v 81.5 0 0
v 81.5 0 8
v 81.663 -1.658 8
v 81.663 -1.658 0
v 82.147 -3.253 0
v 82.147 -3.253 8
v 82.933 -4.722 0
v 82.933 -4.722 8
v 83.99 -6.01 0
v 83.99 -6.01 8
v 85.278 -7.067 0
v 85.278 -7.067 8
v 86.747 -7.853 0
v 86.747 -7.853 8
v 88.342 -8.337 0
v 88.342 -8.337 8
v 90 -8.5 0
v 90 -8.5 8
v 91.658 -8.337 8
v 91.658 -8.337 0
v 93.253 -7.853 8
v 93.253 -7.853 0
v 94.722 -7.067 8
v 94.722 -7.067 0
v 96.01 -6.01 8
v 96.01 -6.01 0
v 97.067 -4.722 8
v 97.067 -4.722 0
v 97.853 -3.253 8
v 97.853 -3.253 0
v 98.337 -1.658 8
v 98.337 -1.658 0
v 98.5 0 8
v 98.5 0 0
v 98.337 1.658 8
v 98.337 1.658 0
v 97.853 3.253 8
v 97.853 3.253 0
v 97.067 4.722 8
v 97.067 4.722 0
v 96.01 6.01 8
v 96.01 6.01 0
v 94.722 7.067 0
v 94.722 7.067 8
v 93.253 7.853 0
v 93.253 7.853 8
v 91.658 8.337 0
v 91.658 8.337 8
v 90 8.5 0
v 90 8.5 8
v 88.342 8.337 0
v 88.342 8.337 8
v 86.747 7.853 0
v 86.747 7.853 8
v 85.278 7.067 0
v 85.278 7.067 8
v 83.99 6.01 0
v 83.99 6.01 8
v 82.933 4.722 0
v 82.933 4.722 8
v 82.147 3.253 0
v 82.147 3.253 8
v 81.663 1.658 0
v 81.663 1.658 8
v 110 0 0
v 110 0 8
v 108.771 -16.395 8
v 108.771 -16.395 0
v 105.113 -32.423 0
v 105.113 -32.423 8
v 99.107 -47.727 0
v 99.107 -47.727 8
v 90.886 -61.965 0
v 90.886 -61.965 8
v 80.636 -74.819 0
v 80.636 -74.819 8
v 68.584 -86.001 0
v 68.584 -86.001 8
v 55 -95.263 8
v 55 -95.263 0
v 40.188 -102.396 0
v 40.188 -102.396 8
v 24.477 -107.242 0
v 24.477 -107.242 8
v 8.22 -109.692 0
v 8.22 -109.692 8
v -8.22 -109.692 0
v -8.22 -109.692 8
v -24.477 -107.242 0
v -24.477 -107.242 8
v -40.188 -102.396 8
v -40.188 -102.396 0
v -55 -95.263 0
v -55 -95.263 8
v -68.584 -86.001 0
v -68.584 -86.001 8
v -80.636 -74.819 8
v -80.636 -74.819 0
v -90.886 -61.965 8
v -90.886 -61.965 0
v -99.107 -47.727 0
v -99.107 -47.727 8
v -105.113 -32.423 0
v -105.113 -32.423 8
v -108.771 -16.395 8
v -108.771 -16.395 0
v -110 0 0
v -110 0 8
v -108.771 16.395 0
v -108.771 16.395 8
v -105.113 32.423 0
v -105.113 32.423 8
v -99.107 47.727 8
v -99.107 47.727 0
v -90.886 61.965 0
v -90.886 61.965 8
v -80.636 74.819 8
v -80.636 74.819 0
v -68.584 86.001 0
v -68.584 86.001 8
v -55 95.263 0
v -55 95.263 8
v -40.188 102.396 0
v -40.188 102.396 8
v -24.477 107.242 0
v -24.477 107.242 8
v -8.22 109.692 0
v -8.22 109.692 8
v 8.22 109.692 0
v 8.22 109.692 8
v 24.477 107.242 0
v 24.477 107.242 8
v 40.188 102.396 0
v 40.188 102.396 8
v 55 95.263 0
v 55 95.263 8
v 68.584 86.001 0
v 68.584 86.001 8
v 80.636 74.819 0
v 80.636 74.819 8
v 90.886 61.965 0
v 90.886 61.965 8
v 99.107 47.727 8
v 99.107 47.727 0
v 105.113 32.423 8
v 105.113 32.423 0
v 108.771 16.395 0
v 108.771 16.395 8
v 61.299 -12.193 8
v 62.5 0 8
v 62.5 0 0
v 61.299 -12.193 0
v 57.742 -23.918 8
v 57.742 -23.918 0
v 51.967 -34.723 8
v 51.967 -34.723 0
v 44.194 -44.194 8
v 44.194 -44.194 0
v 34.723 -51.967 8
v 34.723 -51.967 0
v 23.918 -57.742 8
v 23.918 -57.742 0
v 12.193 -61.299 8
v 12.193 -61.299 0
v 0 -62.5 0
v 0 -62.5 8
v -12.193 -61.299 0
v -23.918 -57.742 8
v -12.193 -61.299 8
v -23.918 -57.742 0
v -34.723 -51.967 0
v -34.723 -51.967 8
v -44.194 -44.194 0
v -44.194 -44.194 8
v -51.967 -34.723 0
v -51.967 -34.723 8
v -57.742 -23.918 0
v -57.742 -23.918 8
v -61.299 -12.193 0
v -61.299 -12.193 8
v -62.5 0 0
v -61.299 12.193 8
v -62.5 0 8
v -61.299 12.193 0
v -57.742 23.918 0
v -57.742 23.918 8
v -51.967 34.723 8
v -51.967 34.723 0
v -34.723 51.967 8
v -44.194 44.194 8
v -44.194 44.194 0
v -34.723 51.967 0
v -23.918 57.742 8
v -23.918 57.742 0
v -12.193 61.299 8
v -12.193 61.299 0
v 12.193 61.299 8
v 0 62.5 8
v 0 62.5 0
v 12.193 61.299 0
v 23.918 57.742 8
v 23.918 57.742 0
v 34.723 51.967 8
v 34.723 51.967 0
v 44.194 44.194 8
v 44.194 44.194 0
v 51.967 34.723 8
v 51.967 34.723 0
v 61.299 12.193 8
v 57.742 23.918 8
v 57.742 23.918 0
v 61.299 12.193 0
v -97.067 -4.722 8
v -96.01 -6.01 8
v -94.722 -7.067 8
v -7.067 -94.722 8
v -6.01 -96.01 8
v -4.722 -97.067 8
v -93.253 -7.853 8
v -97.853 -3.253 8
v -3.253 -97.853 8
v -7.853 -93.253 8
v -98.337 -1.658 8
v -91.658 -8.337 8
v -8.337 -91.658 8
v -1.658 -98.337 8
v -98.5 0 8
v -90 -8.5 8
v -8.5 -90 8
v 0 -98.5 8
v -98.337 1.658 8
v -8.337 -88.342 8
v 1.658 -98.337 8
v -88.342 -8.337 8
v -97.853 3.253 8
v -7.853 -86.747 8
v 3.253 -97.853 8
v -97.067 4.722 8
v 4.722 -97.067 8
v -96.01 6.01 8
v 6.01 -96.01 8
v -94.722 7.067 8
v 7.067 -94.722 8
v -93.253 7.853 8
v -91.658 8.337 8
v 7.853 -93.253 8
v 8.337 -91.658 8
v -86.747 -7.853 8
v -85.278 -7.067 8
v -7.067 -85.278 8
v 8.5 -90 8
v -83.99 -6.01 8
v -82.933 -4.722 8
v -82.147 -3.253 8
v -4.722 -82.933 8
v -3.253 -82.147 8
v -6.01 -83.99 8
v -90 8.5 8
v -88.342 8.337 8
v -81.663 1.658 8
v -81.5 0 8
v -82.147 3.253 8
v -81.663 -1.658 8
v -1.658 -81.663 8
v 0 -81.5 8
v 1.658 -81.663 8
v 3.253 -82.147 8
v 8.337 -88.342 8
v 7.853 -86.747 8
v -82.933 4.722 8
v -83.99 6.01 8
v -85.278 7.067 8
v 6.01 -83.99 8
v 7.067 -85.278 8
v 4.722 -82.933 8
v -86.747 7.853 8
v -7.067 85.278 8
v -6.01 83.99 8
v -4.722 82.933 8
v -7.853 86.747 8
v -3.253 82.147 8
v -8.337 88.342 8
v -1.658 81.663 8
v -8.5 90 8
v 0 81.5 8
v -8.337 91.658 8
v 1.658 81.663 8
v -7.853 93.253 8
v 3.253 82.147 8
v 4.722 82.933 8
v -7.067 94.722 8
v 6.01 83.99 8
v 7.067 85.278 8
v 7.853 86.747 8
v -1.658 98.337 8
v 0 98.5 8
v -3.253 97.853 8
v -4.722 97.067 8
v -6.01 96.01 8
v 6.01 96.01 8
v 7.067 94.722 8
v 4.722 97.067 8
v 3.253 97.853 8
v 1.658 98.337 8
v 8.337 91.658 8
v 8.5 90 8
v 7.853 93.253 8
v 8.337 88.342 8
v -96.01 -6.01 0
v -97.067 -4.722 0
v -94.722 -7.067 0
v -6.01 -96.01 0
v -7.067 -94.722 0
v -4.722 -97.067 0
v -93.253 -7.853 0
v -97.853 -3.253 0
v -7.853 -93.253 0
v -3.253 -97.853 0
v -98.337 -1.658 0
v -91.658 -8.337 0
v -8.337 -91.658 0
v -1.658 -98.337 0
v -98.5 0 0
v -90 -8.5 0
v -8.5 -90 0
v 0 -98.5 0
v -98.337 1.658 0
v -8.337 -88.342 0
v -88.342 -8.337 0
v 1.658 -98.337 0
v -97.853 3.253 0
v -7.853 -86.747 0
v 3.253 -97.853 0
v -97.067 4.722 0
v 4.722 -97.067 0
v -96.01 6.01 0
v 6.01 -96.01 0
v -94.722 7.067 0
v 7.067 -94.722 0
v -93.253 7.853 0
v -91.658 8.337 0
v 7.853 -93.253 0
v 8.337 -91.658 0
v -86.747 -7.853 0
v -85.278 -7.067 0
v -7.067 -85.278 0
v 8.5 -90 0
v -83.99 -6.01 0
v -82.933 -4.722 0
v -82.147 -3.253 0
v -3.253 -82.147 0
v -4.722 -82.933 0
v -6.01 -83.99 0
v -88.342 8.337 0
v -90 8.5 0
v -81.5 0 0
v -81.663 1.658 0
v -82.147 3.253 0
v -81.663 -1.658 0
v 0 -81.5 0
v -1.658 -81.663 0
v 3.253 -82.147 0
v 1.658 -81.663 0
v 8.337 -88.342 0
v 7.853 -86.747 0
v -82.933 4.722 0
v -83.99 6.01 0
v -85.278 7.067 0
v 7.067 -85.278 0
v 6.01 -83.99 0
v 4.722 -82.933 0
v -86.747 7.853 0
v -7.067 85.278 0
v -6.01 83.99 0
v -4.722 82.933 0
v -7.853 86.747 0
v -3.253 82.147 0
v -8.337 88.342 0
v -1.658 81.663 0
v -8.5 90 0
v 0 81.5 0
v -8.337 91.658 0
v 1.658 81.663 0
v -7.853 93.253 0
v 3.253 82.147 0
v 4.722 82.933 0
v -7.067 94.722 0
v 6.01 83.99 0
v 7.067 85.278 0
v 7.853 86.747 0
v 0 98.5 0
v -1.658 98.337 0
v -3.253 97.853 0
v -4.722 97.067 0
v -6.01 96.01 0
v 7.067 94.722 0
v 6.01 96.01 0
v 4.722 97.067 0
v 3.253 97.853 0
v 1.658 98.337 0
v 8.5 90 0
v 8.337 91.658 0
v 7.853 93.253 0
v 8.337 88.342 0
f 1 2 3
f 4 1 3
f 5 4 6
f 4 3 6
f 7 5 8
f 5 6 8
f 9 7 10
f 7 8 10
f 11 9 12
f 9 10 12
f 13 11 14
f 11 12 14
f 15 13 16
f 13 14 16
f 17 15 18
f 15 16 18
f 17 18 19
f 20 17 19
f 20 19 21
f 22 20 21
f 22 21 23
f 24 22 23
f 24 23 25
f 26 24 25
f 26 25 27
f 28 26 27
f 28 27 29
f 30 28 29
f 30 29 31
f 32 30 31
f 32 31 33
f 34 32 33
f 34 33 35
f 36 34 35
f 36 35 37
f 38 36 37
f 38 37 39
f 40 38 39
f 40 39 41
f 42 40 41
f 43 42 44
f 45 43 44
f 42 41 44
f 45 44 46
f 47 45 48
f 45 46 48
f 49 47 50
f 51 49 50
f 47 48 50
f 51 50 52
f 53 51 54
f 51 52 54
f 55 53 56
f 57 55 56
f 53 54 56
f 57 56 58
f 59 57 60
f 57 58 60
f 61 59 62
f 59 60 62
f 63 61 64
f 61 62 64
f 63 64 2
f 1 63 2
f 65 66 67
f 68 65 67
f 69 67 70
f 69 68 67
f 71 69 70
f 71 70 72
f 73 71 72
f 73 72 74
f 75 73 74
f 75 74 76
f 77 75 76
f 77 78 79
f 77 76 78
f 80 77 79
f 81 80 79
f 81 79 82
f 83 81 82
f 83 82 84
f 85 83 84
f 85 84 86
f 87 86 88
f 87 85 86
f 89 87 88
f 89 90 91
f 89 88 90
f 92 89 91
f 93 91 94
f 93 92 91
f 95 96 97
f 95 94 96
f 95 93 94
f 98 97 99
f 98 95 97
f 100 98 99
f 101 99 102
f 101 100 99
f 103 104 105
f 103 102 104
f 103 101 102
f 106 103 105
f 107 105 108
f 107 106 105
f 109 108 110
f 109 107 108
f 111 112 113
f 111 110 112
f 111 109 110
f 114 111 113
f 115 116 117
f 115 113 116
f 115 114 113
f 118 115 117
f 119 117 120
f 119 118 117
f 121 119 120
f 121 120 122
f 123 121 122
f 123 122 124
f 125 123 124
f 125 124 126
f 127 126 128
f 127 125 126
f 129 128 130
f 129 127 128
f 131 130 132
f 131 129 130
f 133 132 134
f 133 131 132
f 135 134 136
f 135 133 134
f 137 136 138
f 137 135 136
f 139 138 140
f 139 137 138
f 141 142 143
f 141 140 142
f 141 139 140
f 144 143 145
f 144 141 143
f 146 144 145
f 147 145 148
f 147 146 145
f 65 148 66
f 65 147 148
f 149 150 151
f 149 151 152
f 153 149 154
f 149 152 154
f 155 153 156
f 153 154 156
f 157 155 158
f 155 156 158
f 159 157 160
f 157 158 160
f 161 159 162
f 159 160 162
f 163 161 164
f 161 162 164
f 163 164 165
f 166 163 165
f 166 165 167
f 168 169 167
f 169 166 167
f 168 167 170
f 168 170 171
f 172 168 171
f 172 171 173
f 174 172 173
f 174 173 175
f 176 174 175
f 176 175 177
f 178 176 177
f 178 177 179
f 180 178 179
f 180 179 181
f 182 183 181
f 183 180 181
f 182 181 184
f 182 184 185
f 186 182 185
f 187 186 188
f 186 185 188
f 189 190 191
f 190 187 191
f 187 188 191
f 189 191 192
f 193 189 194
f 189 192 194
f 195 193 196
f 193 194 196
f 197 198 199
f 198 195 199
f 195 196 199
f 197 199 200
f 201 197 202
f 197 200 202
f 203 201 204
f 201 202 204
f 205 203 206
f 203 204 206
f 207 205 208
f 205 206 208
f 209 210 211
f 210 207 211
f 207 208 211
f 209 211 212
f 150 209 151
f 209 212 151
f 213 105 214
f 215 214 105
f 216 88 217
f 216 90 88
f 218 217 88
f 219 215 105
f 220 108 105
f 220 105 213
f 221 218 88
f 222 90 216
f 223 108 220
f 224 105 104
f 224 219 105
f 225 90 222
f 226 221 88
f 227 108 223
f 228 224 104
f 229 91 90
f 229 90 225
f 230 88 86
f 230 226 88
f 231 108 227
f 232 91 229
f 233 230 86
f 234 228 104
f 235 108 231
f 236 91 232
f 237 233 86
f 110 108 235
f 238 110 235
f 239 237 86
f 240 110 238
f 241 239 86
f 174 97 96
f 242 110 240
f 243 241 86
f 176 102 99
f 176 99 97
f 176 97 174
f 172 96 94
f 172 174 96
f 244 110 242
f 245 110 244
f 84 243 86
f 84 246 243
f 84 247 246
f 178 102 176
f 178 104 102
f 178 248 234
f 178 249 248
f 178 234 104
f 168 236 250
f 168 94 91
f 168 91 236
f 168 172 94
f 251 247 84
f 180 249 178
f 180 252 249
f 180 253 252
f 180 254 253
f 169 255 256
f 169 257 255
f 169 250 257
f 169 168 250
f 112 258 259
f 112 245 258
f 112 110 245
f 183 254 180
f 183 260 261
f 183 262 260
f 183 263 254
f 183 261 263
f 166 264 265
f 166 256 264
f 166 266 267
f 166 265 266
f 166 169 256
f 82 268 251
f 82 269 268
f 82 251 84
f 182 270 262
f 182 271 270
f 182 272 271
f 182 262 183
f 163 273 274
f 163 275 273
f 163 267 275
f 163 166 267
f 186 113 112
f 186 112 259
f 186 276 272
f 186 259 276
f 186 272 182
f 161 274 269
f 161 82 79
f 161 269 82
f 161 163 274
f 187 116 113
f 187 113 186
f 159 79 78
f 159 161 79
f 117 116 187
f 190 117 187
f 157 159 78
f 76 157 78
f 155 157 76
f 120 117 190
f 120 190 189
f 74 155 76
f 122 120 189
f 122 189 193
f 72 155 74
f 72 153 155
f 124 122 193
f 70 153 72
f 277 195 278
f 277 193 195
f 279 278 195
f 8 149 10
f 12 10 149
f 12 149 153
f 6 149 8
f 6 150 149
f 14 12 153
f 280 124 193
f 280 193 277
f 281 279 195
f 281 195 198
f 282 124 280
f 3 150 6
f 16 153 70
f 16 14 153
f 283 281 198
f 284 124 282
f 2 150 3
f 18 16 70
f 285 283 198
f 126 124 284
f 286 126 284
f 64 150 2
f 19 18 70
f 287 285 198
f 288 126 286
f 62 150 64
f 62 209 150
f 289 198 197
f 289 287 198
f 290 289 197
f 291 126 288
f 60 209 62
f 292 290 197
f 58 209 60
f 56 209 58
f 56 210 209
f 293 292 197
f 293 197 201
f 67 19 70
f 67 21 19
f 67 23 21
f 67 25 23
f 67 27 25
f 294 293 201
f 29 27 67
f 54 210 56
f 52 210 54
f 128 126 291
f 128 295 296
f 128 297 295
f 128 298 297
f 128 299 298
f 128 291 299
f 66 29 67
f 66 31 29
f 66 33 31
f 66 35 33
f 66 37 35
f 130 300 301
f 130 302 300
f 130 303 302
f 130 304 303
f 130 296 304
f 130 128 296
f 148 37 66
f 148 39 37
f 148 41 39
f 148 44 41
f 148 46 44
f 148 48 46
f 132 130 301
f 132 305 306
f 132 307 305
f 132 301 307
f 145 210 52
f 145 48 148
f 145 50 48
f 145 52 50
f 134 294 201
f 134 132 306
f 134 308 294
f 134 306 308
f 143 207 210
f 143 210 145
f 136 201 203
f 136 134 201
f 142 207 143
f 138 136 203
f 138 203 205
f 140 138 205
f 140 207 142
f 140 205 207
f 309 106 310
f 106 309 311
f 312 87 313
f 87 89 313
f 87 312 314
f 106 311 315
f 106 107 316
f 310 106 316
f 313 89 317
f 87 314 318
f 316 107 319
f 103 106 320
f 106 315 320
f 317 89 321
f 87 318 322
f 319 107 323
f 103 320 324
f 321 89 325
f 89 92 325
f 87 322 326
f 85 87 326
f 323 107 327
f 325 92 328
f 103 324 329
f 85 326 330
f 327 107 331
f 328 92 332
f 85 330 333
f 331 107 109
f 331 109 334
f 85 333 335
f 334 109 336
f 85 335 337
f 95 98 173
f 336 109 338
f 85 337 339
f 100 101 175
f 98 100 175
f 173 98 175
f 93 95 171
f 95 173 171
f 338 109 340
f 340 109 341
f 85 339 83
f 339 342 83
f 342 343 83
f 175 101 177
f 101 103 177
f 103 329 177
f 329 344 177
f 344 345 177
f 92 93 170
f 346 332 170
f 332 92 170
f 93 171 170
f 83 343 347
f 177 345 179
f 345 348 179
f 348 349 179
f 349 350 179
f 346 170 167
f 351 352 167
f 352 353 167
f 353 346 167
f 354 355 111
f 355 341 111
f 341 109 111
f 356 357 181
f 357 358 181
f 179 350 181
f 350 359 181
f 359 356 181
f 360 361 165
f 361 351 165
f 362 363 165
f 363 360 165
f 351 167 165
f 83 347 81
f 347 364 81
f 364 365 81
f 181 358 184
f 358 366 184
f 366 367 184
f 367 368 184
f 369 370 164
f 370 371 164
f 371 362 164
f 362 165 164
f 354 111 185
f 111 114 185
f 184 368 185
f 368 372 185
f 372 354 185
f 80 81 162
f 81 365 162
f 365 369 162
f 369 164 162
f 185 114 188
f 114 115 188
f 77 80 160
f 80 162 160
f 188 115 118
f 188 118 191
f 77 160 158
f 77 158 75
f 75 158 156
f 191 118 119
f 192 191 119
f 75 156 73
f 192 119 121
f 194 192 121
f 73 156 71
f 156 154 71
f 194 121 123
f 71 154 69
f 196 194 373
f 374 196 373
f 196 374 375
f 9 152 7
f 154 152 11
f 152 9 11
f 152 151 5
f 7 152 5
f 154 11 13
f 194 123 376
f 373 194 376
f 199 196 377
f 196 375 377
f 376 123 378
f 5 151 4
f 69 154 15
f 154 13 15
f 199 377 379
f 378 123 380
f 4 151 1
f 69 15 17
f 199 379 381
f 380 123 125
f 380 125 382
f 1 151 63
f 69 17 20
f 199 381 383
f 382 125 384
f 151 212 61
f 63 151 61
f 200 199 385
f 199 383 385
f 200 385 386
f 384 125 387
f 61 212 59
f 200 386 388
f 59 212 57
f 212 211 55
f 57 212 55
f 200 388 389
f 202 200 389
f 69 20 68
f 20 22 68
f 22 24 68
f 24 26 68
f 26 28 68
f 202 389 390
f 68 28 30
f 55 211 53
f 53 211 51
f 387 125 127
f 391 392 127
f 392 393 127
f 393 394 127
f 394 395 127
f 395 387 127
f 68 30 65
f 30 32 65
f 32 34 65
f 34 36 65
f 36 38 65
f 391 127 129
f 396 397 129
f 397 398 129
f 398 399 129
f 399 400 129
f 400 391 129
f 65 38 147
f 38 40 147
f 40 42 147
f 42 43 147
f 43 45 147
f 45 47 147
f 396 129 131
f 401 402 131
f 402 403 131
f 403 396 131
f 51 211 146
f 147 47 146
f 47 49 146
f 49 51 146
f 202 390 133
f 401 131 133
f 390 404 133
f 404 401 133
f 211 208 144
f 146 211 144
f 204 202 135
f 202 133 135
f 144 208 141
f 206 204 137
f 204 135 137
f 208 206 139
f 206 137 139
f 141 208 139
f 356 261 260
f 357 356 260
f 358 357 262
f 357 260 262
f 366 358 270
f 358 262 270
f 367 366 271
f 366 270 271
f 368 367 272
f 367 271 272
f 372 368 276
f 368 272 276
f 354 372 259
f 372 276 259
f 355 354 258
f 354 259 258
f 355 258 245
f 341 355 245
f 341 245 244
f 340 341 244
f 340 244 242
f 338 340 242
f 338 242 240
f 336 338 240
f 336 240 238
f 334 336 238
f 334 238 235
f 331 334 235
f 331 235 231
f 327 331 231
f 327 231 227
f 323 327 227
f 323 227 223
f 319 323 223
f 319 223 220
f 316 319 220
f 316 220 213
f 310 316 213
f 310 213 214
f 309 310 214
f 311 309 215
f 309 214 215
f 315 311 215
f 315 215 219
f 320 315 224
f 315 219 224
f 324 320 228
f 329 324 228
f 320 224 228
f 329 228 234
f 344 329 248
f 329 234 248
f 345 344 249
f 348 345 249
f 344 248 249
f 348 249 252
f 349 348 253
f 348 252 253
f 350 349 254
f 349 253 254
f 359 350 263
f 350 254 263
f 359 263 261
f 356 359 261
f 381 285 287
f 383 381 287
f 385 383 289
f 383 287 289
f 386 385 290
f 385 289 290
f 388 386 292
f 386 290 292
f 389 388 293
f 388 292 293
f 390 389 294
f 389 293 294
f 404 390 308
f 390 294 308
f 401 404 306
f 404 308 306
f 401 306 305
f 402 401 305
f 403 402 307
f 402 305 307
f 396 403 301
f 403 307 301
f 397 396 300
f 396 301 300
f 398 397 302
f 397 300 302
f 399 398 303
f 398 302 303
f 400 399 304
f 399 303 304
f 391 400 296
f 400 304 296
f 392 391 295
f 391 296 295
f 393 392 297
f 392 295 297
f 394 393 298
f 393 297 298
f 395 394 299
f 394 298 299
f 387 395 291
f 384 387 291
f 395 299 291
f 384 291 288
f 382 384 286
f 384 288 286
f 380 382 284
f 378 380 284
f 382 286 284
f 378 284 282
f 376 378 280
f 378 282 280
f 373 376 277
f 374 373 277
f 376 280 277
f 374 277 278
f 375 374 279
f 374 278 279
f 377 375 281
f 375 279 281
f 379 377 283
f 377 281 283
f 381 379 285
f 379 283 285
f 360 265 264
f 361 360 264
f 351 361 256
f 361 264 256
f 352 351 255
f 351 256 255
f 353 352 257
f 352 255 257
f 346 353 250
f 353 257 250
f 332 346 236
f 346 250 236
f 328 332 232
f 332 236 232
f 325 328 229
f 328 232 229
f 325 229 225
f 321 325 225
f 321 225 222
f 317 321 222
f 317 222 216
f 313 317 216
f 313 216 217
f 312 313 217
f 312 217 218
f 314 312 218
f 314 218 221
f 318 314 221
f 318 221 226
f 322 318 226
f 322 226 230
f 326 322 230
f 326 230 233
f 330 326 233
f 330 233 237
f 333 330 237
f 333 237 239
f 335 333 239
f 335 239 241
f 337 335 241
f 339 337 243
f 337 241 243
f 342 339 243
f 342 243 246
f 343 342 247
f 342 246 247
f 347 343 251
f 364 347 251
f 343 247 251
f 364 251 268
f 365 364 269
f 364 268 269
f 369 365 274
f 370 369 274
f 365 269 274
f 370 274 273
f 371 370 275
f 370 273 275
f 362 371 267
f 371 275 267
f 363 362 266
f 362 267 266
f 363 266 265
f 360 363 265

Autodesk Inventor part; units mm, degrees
ref_plane "YZ Plane" through (0, 0, 0) normal (1, 0, 0) x (0, 1, 0)
ref_plane "XZ Plane" through (0, 0, 0) normal (0, 1, 0) x (-1, 0, 0)
ref_plane "XY Plane" through (0, 0, 0) normal (0, 0, 1) x (1, 0, 0)
sketch "Sketch2" plane through (0, 0, 0) normal (0, 0, 1) x (1, 0, 0)
  circle A0 centre (0, 0) radius 62.5
  circle A1 centre (0, 0) radius 110
  dimension "d25" = 125
  dimension "d27" = 220
extrude "Plate2" add sketch "Sketch2" along normal blind 8
sketch "Sketch3" plane through (0, 0, 8) normal (0, 0, 1) x (1, 0, 0)
  circle A0 centre (-90, 0) radius 8.5
  circle A1 centre (0, 0) radius 90 construction
  dimension "d28" = 180
  dimension "d15" = 17
extrude "Cut1" cut sketch "Sketch3" against normal blind 8
pattern_circular "Circular Pattern1" count 4 over 360 about axis through (0, 0, -10) along (0, 0, 1) of "Cut1"
equation "\"d17\" = Thickness"
equation "\"d14\" = Thickness"
equation "\"BendReliefWidth\" = Thickness"
equation "\"BendReliefDepth\" = 0.5 * Thickness"
equation "\"CornerReliefSize\" = 4 * Thickness"
equation "\"MinimumRemnant\" = 2 * Thickness"
equation "\"TransitionRadius\" = BendRadius"
equation "\"JacobiRadiusSize\" = BendRadius"
equation "\"GapSize\" = Thickness"
equation "\"Thickness\" = 8"
equation "\"BendRadius\" = 6"
properties part number "APN 1431 FDS flange DN90" material "Steel"
